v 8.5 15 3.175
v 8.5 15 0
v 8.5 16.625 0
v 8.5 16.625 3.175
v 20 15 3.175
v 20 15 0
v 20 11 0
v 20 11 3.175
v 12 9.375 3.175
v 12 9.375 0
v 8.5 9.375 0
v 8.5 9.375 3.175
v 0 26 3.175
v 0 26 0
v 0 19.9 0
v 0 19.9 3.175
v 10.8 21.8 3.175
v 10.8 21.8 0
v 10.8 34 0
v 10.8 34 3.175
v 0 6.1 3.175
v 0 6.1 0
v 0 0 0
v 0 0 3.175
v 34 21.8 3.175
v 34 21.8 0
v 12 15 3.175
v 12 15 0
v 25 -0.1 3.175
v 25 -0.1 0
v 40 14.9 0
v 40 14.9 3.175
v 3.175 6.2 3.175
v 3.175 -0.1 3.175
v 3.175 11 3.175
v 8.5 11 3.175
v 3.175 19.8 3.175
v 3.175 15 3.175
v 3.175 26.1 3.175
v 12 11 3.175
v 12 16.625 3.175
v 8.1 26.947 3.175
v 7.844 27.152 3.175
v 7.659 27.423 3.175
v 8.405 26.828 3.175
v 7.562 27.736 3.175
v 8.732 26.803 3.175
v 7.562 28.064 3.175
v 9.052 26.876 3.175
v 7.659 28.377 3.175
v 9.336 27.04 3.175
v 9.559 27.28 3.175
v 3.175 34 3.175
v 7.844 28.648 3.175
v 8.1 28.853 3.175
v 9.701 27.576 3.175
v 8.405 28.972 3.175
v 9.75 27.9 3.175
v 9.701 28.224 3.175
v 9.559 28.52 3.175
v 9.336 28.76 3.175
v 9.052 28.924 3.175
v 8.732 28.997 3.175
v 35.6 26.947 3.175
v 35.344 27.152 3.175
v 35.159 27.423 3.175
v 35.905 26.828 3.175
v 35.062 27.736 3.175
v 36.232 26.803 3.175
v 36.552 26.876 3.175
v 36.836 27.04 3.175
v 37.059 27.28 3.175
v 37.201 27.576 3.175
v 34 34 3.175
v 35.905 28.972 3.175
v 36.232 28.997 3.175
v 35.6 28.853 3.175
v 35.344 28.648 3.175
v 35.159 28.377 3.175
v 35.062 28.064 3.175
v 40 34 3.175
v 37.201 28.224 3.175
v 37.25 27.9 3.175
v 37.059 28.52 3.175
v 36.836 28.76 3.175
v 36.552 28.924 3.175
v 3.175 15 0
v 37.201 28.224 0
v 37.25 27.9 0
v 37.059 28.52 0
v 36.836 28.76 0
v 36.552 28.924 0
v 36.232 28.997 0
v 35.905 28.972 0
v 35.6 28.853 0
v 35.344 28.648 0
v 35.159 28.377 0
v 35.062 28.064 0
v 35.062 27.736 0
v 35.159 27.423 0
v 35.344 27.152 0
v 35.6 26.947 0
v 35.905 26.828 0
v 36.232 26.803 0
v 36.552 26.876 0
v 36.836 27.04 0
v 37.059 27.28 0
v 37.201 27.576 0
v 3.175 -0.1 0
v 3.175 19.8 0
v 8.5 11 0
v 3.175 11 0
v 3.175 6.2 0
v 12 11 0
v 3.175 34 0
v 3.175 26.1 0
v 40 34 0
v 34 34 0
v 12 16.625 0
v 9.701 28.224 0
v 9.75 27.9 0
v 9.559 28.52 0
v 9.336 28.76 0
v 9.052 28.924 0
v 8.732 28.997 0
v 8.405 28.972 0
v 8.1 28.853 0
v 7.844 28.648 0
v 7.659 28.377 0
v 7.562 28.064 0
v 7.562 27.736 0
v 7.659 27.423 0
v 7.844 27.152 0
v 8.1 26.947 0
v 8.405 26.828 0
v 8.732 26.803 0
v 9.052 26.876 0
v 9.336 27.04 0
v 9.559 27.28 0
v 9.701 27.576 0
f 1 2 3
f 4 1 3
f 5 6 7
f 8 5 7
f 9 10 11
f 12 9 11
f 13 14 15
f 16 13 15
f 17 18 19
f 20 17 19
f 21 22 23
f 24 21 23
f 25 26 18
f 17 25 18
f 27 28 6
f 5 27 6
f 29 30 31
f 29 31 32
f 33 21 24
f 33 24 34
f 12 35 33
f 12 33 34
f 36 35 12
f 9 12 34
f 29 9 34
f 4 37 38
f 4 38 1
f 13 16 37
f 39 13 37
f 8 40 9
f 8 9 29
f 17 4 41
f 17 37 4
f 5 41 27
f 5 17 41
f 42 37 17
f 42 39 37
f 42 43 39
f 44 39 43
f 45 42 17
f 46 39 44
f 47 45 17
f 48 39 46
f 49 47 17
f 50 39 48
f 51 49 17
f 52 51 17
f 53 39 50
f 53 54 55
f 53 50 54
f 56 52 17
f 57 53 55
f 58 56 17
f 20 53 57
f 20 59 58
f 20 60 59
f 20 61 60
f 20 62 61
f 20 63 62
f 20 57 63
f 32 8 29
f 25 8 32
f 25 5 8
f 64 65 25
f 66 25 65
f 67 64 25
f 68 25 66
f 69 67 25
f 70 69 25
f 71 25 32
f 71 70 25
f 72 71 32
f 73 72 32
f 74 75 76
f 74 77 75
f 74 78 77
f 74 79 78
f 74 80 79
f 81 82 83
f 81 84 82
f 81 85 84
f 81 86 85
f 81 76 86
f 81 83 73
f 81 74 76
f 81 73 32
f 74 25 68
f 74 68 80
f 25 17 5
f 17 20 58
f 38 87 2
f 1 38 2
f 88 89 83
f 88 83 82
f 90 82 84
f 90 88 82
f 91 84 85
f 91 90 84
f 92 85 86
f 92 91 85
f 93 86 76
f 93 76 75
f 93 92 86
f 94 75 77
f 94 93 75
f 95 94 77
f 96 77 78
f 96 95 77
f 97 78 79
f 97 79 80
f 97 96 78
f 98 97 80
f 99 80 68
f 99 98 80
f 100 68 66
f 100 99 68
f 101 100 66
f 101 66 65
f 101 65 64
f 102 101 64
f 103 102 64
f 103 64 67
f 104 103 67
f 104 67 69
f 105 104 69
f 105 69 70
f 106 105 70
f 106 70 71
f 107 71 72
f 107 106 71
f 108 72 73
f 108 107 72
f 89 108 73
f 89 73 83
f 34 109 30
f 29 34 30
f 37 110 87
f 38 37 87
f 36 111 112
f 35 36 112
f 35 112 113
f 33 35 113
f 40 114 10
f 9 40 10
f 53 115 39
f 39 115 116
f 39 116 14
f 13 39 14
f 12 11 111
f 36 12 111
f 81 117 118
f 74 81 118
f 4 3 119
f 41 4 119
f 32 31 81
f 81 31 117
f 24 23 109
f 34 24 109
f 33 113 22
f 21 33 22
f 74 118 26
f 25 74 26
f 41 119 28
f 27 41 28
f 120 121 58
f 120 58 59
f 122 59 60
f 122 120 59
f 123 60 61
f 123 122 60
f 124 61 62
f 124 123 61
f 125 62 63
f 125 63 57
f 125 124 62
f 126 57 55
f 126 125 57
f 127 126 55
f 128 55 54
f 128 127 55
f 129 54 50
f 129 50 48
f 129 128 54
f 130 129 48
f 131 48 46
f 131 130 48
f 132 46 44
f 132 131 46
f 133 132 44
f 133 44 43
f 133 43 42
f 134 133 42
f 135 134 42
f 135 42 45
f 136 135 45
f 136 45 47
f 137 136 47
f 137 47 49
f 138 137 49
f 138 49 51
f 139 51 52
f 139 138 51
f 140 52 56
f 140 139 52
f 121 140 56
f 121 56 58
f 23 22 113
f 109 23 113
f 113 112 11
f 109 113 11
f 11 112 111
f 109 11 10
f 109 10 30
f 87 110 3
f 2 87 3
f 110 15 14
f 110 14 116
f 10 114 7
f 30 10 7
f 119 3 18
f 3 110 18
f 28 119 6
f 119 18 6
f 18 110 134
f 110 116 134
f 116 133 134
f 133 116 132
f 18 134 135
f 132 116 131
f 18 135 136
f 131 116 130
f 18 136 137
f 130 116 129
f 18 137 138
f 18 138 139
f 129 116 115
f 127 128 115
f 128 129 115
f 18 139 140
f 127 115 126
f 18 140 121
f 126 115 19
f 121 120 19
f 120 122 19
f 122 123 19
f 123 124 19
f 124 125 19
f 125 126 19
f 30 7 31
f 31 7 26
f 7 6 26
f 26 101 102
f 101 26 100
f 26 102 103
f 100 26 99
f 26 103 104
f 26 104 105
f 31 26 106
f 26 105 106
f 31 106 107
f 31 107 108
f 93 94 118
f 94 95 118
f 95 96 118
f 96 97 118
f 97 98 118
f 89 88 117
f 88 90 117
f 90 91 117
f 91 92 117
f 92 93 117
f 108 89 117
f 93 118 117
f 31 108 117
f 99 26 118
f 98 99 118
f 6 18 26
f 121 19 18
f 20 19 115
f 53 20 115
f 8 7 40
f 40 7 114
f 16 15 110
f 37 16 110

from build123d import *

# Parameters (mm, degrees)
SKETCH1_R           = 1.1
BOSS_EXTRUDE1_DEPTH = 3.175
CHAMFER1_SIZE       = 15


with BuildPart() as part:
    # Sketch1 → Boss-Extrude1 (new body)
    # profile 1 of 6: a face of its own
    with BuildSketch(Plane.XY):
        Polygon((10.8, 21.8), (10.8, 34), (3.175, 34), (3.175, 26.1), (3.175, 26), (0, 26), (0, 19.9), (3.175, 19.9), (3.175, 19.8), (3.175, 17), (40, 17), (40, 34), (34, 34), (34, 21.8), align=None)
        with Locations((8.65, 27.9)):
            Circle(SKETCH1_R, mode=Mode.SUBTRACT)
        with Locations((36.15, 27.9)):
            Circle(SKETCH1_R, mode=Mode.SUBTRACT)
    # profile 2 of 6: a face of its own
    with BuildSketch(Plane.XY):
        Polygon((40, 0), (40, 17), (3.175, 17), (3.175, 15), (8.5, 15), (8.5, 16.625), (12, 16.625), (12, 15), (20, 15), (20, 11), (12, 11), (12, 9.375), (8.5, 9.375), (8.5, 11), (3.175, 11), (3.175, 6.2), (3.175, 6.1), (0, 6.1), (0, 0), align=None)
    # profile 3 of 6: a face of its own
    with BuildSketch(Plane.XY):
        Polygon((3.175, 26), (3.175, 26.1), (0, 26), align=None)
    # profile 4 of 6: a face of its own
    with BuildSketch(Plane.XY):
        Polygon((3.175, 19.9), (0, 19.9), (3.175, 19.8), align=None)
    # profile 5 of 6: a face of its own
    with BuildSketch(Plane.XY):
        Polygon((3.175, 6.2), (0, 6.1), (3.175, 6.1), align=None)
    # profile 6 of 6: a face of its own
    with BuildSketch(Plane.XY):
        Polygon((40, -0.1), (40, 0), (0, 0), (3.175, -0.1), align=None)
    extrude(amount=BOSS_EXTRUDE1_DEPTH)

    # Chamfer1
    chamfer1_edges = [part.edges().sort_by_distance(p)[0] for p in [
        (40, -0.1, 1.5875),
    ]]
    chamfer(chamfer1_edges, length=CHAMFER1_SIZE)


solid = part.part
